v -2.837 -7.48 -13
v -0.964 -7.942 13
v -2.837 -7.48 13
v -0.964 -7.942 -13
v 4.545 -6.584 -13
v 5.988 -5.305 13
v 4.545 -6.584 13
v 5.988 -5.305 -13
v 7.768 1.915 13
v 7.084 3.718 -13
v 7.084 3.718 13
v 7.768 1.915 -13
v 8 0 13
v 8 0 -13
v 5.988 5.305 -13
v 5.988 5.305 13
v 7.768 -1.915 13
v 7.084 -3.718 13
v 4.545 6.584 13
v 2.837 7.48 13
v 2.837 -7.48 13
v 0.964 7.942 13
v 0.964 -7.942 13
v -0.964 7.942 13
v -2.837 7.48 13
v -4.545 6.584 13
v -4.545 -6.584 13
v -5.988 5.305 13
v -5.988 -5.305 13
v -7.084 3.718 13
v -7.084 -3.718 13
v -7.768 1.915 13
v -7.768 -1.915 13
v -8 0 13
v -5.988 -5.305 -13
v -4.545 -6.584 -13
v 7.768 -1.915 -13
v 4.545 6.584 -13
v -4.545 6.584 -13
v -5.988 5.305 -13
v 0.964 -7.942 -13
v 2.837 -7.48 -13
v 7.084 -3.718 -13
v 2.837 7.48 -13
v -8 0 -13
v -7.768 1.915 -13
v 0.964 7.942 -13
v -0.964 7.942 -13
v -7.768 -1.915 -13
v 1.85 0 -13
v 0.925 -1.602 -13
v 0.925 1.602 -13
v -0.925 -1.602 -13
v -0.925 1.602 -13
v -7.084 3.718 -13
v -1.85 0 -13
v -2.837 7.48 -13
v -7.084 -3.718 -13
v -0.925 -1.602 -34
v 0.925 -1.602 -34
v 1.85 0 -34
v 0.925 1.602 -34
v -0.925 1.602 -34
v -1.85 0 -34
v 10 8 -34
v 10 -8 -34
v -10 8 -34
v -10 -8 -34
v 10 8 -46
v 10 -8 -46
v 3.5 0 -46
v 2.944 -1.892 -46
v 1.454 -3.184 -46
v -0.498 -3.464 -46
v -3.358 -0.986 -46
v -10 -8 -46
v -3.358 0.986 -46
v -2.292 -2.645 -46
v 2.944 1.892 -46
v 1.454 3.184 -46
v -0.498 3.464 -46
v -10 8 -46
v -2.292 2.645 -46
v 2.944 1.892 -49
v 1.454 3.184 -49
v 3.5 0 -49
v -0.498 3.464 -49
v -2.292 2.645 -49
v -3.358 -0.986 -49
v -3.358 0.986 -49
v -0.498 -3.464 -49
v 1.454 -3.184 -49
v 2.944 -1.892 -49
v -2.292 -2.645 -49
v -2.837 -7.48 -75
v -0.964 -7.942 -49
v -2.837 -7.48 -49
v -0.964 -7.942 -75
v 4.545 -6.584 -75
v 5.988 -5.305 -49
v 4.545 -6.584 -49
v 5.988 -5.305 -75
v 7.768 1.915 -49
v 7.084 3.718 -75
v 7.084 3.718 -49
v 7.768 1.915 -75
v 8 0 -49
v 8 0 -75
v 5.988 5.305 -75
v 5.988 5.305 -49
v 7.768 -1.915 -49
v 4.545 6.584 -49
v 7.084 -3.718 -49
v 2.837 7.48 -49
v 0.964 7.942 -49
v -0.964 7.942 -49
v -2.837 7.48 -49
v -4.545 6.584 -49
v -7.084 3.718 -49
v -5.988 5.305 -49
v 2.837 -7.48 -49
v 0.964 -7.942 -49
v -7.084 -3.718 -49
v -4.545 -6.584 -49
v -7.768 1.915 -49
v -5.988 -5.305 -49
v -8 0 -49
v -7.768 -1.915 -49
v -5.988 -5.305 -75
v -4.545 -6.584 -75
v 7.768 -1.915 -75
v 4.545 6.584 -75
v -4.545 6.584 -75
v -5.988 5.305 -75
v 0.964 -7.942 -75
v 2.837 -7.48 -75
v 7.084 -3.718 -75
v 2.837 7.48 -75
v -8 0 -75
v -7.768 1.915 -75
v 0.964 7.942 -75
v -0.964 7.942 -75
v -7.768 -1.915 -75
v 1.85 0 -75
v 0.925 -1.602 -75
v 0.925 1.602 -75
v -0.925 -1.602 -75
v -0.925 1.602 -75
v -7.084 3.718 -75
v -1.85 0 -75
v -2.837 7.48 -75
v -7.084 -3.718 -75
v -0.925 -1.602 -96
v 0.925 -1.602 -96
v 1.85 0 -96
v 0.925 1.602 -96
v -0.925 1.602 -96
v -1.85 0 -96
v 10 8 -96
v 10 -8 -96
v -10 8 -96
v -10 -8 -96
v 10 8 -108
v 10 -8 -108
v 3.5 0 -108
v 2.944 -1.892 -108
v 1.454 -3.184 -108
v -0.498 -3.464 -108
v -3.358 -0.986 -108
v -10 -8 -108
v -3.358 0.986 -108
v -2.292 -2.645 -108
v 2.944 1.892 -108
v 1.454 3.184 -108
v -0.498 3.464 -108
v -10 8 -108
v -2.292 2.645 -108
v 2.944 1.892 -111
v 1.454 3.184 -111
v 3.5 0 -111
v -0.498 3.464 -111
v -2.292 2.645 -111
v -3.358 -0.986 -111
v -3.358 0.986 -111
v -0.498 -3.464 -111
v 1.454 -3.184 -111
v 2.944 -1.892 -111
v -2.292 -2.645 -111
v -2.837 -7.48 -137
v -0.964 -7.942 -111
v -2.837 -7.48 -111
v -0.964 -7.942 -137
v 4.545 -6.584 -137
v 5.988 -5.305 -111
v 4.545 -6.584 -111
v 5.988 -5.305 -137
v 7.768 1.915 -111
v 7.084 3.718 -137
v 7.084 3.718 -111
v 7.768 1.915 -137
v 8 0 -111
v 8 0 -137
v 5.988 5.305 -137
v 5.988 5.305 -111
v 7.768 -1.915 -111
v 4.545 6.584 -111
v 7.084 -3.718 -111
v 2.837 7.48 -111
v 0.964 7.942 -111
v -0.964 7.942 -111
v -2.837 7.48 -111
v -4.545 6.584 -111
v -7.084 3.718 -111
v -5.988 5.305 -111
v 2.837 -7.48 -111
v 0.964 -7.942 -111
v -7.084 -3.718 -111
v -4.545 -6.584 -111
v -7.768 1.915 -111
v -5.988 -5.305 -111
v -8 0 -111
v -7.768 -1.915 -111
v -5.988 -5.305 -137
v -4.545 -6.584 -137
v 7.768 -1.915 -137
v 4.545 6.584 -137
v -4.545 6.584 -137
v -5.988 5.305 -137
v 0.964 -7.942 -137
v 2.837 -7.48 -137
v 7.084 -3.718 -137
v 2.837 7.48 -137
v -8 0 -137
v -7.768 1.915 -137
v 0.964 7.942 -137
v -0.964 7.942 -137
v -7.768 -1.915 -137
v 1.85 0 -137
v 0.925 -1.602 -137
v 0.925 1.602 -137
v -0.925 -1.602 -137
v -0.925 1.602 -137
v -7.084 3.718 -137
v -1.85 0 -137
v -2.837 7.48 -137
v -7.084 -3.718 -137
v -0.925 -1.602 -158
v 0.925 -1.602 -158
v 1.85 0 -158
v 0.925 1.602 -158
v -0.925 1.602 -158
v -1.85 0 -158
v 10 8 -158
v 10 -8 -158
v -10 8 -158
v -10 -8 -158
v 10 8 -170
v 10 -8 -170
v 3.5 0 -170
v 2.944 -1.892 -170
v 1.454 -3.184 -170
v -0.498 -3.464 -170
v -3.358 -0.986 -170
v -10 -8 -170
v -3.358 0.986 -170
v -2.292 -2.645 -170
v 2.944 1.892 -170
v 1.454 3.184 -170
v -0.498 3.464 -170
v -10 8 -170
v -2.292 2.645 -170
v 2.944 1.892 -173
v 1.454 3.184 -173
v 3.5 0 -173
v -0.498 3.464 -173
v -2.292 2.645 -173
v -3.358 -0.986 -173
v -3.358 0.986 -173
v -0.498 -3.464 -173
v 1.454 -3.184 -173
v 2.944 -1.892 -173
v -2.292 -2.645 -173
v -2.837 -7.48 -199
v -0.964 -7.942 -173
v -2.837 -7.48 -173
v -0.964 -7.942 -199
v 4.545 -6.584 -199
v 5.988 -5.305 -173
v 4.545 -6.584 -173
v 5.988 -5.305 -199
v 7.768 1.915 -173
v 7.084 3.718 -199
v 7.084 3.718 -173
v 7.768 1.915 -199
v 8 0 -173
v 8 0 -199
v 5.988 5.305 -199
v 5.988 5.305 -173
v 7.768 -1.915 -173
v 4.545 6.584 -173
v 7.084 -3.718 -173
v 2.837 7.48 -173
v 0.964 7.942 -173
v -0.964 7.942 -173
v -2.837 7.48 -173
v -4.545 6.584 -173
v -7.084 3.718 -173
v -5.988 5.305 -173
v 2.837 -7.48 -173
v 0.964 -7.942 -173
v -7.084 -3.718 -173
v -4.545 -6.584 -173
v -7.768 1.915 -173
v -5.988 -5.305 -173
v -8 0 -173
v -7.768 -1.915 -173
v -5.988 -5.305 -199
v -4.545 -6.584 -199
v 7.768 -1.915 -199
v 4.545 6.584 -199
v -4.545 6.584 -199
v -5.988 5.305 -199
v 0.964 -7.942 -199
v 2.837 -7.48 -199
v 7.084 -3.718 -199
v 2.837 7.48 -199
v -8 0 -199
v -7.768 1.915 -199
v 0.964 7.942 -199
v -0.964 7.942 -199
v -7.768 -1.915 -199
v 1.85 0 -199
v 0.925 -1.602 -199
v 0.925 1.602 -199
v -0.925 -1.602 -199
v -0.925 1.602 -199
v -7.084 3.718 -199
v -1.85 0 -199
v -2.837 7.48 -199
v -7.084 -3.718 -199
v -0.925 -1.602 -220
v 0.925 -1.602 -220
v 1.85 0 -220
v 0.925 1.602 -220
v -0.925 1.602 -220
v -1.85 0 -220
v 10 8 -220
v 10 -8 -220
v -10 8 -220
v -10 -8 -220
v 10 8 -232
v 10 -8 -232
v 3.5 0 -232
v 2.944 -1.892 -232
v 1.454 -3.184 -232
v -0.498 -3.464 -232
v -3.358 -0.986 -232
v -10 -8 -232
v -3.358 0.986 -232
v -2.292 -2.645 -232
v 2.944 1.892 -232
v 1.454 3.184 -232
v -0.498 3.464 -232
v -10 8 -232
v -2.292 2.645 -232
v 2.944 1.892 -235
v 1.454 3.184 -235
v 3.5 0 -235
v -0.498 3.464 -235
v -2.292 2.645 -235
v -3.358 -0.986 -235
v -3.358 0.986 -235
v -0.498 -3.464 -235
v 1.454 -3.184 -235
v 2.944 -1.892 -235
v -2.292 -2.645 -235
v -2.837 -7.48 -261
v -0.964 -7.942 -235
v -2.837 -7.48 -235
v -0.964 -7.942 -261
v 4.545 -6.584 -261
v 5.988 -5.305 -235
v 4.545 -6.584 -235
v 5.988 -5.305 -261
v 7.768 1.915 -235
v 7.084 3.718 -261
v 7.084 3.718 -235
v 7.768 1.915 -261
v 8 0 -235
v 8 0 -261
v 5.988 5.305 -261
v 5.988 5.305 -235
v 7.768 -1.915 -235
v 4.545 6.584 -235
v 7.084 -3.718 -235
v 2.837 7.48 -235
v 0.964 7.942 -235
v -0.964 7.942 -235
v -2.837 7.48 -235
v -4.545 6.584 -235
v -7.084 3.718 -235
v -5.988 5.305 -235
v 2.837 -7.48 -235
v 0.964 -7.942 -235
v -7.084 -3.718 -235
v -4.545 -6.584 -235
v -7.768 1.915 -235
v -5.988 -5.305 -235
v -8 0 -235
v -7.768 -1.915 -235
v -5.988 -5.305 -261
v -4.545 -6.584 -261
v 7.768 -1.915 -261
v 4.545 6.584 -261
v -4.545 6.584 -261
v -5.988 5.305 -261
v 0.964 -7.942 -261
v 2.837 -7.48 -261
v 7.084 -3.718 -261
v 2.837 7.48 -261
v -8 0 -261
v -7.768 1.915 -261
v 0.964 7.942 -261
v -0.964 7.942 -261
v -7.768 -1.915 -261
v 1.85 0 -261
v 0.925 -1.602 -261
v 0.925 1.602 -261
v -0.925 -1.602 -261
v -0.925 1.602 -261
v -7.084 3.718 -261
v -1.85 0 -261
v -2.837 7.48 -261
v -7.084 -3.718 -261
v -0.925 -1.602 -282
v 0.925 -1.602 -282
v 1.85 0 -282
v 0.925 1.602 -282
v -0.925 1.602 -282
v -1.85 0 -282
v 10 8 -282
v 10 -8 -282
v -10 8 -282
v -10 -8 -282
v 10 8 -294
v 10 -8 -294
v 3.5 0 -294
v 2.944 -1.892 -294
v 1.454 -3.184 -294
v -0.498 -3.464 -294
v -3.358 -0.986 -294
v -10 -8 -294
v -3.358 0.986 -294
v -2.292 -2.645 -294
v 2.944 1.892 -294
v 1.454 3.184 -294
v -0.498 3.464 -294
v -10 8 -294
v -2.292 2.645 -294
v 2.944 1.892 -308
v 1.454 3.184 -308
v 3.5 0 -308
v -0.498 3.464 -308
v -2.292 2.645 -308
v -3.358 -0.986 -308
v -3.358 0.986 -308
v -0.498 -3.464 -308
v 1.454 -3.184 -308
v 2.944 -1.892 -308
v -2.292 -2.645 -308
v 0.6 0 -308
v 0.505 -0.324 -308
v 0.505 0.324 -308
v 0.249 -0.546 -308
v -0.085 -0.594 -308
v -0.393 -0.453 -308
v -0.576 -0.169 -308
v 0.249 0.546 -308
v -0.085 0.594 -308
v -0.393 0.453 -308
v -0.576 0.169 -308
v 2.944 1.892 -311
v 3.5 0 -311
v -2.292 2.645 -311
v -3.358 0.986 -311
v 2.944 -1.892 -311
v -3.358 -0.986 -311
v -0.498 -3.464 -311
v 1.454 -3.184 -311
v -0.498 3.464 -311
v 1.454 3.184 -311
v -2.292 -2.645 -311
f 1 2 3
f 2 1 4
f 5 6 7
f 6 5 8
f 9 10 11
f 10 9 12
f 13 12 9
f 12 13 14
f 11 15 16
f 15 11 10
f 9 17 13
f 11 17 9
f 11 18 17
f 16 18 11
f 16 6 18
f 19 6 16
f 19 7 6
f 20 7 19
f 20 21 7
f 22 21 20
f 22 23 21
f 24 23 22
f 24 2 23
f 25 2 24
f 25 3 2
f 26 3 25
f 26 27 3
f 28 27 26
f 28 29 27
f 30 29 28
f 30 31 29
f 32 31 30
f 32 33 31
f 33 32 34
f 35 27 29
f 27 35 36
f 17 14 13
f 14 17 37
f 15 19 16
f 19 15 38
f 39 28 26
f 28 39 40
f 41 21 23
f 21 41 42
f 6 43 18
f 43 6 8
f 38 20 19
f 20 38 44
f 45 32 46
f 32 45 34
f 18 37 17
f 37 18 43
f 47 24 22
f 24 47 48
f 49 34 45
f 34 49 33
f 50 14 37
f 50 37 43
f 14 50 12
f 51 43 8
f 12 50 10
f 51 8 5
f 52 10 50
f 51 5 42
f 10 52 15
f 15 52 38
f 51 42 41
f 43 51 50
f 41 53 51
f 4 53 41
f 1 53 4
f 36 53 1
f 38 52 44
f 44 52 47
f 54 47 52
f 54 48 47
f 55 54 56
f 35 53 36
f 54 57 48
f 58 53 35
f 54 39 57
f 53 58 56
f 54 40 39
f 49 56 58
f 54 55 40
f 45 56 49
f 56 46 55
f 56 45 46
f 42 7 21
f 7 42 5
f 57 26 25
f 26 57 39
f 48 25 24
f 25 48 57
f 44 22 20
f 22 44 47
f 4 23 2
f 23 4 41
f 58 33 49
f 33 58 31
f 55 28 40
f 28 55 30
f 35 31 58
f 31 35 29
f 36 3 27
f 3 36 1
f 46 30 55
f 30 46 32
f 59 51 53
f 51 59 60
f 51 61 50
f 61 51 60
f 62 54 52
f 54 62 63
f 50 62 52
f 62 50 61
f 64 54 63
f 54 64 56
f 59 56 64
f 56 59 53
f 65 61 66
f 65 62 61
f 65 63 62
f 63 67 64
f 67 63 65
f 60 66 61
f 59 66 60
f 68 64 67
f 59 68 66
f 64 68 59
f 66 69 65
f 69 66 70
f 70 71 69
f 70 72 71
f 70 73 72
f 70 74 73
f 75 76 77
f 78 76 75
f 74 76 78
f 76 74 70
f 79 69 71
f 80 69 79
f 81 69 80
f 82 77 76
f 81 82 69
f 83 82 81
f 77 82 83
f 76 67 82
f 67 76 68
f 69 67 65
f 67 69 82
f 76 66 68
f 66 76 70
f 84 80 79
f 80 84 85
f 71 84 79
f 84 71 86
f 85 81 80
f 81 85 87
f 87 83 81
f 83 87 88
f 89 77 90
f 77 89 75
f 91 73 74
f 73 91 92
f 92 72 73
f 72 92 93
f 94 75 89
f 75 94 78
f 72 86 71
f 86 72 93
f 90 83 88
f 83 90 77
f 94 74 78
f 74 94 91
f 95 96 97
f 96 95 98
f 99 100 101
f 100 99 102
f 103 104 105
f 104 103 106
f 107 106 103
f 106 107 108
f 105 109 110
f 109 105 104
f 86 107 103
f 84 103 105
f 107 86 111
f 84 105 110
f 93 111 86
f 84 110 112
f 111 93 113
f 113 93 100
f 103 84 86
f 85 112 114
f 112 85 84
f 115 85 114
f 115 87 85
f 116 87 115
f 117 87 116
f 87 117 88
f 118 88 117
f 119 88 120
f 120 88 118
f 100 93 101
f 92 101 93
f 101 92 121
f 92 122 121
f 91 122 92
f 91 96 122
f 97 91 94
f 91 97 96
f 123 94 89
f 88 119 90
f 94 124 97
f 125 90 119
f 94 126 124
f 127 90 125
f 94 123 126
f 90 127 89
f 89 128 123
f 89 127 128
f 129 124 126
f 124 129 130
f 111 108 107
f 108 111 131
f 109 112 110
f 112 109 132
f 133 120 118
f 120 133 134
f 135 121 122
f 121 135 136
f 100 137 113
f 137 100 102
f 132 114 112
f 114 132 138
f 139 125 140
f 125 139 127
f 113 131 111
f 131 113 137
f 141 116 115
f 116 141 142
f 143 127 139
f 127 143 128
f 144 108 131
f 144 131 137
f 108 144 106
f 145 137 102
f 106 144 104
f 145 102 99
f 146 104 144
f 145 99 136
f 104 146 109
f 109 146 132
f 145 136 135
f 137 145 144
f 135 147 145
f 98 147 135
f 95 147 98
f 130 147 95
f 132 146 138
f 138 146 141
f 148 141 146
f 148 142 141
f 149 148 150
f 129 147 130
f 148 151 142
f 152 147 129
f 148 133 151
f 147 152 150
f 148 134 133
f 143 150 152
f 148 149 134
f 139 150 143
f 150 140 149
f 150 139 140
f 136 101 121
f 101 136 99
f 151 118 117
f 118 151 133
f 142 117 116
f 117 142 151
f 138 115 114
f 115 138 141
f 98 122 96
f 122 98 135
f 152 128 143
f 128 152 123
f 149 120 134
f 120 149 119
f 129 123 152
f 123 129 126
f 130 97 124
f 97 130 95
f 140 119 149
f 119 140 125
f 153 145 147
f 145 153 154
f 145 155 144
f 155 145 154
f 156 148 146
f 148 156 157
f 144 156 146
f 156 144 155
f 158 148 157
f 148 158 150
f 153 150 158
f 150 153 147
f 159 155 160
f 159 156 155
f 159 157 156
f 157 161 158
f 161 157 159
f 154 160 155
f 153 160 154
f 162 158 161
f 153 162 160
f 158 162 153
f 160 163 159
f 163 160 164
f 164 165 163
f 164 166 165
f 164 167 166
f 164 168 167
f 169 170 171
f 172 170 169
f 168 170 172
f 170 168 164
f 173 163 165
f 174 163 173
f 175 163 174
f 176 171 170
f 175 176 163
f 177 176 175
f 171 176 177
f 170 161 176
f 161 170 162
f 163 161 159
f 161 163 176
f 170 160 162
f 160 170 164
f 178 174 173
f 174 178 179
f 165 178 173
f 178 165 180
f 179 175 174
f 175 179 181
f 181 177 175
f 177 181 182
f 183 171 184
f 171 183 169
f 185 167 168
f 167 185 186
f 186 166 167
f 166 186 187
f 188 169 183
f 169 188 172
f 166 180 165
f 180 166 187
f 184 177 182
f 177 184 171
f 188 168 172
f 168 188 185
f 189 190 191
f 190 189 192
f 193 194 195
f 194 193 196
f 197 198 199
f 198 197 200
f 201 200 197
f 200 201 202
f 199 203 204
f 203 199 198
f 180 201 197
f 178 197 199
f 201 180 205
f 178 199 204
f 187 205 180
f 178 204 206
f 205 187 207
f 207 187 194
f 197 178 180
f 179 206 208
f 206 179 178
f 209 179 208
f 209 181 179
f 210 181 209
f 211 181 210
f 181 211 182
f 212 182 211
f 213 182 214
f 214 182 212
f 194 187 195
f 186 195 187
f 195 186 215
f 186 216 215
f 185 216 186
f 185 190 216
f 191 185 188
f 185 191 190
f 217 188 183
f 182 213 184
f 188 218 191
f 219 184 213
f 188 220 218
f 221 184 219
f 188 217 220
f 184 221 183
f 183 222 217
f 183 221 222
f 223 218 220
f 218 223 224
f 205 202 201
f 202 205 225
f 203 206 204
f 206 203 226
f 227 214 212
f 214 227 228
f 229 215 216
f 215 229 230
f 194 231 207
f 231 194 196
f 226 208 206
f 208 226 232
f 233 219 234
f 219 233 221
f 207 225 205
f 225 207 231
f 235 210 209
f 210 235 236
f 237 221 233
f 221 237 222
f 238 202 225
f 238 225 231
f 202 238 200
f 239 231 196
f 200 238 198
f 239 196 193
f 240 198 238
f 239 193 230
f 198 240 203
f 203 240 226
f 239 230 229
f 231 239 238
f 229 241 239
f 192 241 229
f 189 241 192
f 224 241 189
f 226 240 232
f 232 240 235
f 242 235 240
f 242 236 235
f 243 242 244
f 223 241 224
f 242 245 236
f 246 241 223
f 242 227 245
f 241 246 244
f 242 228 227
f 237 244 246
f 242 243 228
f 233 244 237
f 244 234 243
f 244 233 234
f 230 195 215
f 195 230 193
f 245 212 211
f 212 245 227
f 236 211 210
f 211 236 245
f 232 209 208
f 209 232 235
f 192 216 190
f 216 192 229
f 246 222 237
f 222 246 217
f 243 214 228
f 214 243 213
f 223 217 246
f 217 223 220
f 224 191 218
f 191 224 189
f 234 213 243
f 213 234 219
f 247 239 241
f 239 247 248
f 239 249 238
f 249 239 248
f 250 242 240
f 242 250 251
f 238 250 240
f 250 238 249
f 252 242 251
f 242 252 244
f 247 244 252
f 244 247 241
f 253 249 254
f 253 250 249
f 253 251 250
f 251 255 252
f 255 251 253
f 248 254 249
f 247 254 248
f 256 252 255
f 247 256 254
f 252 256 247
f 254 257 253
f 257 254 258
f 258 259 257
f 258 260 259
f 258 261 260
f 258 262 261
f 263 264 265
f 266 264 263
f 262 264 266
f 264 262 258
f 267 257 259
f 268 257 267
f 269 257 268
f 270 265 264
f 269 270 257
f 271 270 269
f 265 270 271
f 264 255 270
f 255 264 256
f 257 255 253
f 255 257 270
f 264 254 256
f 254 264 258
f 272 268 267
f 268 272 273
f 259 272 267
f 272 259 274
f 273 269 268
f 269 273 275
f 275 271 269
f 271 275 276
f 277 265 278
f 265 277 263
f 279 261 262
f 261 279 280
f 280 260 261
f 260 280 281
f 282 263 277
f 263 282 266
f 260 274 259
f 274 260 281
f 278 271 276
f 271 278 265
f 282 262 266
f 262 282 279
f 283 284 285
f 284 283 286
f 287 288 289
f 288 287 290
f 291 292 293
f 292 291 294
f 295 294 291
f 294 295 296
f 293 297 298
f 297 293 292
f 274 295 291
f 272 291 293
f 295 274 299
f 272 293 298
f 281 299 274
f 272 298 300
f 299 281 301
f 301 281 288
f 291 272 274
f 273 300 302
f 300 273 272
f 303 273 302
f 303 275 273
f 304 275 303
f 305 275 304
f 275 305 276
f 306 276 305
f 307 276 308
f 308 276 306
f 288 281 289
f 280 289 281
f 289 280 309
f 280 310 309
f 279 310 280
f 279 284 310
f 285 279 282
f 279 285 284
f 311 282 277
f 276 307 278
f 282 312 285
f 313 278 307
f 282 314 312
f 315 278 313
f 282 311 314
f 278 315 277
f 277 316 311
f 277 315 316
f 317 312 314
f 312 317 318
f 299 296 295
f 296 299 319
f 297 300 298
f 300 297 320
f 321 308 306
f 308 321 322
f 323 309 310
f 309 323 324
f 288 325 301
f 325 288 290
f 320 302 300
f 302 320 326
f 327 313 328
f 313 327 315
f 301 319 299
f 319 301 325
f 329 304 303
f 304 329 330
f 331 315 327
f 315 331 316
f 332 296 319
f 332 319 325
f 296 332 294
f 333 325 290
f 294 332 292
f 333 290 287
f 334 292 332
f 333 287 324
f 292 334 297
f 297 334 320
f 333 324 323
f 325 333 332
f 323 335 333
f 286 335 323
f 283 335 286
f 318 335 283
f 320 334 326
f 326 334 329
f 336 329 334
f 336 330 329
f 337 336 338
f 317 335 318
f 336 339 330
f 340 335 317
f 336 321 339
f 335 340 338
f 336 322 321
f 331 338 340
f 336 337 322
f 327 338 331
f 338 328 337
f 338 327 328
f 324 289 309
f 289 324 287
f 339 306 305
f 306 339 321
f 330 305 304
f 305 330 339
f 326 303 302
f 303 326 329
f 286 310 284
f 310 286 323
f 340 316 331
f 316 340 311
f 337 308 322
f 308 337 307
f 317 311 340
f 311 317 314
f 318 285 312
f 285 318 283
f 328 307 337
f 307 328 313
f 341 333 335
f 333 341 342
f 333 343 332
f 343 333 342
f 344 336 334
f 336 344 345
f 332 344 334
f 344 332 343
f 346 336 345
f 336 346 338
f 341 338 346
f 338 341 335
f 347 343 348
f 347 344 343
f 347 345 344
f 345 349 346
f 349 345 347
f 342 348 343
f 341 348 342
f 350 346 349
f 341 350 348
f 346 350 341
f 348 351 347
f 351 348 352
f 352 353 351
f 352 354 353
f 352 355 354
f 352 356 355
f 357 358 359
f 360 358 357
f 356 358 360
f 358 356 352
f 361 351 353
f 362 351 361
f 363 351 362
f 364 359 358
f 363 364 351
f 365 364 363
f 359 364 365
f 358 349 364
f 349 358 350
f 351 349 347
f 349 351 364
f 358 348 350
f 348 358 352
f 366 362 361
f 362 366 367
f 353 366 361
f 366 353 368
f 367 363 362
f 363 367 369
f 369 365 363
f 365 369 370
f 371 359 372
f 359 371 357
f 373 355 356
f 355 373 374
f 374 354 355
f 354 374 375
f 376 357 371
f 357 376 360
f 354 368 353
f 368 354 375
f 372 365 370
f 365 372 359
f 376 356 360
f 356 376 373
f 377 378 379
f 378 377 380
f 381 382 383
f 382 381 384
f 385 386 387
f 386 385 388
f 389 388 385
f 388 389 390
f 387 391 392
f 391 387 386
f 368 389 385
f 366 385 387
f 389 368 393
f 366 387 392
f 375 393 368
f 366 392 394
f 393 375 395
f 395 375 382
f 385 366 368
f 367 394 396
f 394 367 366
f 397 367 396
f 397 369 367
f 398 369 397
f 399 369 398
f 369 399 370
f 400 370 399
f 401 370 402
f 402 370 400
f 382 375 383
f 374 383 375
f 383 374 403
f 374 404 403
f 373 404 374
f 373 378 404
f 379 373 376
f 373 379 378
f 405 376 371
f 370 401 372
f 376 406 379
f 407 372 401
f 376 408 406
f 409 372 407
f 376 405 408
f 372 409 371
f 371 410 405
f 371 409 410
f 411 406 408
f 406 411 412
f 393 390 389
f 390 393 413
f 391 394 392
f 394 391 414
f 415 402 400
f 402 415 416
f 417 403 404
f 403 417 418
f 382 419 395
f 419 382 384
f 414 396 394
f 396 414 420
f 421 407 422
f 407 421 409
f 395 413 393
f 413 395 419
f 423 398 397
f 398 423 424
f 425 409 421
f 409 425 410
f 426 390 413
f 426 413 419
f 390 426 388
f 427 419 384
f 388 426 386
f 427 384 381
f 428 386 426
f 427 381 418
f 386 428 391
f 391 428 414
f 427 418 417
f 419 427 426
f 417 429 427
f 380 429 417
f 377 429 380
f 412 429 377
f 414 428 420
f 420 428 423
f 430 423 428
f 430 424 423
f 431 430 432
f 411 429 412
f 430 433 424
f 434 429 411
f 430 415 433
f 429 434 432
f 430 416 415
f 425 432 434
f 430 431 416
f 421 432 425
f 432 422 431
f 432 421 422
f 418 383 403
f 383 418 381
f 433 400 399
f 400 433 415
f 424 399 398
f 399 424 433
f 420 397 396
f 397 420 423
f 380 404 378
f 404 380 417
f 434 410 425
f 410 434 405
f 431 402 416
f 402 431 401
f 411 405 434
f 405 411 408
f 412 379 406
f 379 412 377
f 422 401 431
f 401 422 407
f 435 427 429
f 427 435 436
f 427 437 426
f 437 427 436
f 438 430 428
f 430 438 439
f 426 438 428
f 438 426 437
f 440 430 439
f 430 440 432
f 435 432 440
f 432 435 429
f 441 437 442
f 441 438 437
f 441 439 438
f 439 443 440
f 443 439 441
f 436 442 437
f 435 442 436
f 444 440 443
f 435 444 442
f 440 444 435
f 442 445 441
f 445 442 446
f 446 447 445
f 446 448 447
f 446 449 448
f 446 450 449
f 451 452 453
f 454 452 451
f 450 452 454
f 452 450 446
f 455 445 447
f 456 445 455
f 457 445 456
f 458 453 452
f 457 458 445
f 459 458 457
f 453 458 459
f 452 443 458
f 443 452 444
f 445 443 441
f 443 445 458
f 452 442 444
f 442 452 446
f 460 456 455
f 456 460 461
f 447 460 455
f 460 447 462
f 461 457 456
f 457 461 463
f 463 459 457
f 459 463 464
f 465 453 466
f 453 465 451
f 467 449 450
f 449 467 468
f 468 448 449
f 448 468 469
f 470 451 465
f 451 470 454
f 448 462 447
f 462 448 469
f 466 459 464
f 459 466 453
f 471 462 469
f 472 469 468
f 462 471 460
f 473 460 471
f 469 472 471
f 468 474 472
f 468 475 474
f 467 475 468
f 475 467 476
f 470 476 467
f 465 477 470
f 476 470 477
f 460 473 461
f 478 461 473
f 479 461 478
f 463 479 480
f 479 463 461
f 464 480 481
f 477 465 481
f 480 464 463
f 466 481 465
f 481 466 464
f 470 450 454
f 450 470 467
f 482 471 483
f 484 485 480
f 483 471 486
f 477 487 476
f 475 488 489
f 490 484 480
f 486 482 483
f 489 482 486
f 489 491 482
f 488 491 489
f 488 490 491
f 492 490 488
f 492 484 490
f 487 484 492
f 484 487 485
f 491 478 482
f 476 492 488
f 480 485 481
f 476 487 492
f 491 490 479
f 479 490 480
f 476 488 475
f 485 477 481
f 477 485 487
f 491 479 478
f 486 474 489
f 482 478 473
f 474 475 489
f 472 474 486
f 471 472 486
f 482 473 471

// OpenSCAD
// Parameters
total_length_mm = 62; //[31:124:1]
barrel_diameter_mm = 3.7; //[2:7.4:0.1]
filament_diameter_mm = 1.75; //[1:3:0.01]
filament_clearance_mm = 0.2; //[0.05:0.6:0.01]
overlap_mm = 1; //[0.5:2:0.1]
heatsink_diameter_mm = 16; //[8:32:0.5]
heatsink_length_mm = 26; //[13:52:1]
groove_outer_diameter_mm = 12; //[6:24:0.5]
groove_width_mm = 4; //[2:8:0.5]
groove_depth_mm = 1.5; //[0.8:3:0.1]
barrel_length_mm = 22; //[11:44:1]
heater_block_size_x_mm = 20; //[10:40:1]
heater_block_size_y_mm = 16; //[8:32:1]
heater_block_size_z_mm = 12; //[6:24:1]
heater_cartridge_diameter_mm = 6; //[3:10:0.1]
thermistor_diameter_mm = 3; //[1.5:6:0.1]
nozzle_body_diameter_mm = 7; //[4:14:0.1]
nozzle_length_mm = 14; //[7:28:0.5]
nozzle_tip_diameter_mm = 1.2; //[0.6:3:0.05]
nozzle_tip_length_mm = 3; //[1.5:6:0.1]

// Hot End - complete geometry
module hot_end() {
  color("Silver") {
    // Insulator Heatsink Body
    translate([0, 0, 0])
      cylinder(r=heatsink_diameter_mm/2, h=heatsink_length_mm, center=true);

    // Barrel Heatbreak
    translate([0, 0, -heatsink_length_mm/2 - barrel_length_mm/2 + overlap_mm])
      cylinder(r=barrel_diameter_mm/2, h=barrel_length_mm, center=true);

    // Heater Block
    translate([0, 0, -heatsink_length_mm/2 - barrel_length_mm - heater_block_size_z_mm/2 + overlap_mm])
      cube([heater_block_size_x_mm, heater_block_size_y_mm, heater_block_size_z_mm], center=true);

    // Nozzle Tip
    translate([0, 0, -heatsink_length_mm/2 - barrel_length_mm - heater_block_size_z_mm - nozzle_length_mm/2 + overlap_mm])
      cylinder(r=nozzle_body_diameter_mm/2, h=nozzle_length_mm, center=true);

    // Nozzle Tip Cone
    translate([0, 0, -heatsink_length_mm/2 - barrel_length_mm - heater_block_size_z_mm - nozzle_length_mm - nozzle_tip_length_mm/2 + overlap_mm])
      cylinder(r1=nozzle_body_diameter_mm/2, r2=nozzle_tip_diameter_mm/2, h=nozzle_tip_length_mm, center=true);
  }
}

// Jhead Hot End - complete geometry
module jhead_hot_end() {
  color("DimGray") {
    // Similar structure to hot_end, but with specific Jhead features
    hot_end();
  }
}

// E3D Hot End Assembly - complete geometry
module e3d_hot_end_assembly() {
  color("Black") {
    // Similar structure to hot_end, but with specific E3D features
    hot_end();
  }
}

// Jhead Hot End Assembly - complete geometry
module jhead_hot_end_assembly() {
  color("DimGray") {
    // Similar structure to hot_end, but with specific Jhead assembly features
    hot_end();
  }
}

// E3D Hot End - complete geometry
module e3d_hot_end() {
  color("Black") {
    // Similar structure to hot_end, but with specific E3D features
    hot_end();
  }
}

// Assembly
module assembly() {
  hot_end();
  translate([0, 0, -total_length_mm]) jhead_hot_end();
  translate([0, 0, -2*total_length_mm]) e3d_hot_end_assembly();
  translate([0, 0, -3*total_length_mm]) jhead_hot_end_assembly();
  translate([0, 0, -4*total_length_mm]) e3d_hot_end();
}

assembly();
